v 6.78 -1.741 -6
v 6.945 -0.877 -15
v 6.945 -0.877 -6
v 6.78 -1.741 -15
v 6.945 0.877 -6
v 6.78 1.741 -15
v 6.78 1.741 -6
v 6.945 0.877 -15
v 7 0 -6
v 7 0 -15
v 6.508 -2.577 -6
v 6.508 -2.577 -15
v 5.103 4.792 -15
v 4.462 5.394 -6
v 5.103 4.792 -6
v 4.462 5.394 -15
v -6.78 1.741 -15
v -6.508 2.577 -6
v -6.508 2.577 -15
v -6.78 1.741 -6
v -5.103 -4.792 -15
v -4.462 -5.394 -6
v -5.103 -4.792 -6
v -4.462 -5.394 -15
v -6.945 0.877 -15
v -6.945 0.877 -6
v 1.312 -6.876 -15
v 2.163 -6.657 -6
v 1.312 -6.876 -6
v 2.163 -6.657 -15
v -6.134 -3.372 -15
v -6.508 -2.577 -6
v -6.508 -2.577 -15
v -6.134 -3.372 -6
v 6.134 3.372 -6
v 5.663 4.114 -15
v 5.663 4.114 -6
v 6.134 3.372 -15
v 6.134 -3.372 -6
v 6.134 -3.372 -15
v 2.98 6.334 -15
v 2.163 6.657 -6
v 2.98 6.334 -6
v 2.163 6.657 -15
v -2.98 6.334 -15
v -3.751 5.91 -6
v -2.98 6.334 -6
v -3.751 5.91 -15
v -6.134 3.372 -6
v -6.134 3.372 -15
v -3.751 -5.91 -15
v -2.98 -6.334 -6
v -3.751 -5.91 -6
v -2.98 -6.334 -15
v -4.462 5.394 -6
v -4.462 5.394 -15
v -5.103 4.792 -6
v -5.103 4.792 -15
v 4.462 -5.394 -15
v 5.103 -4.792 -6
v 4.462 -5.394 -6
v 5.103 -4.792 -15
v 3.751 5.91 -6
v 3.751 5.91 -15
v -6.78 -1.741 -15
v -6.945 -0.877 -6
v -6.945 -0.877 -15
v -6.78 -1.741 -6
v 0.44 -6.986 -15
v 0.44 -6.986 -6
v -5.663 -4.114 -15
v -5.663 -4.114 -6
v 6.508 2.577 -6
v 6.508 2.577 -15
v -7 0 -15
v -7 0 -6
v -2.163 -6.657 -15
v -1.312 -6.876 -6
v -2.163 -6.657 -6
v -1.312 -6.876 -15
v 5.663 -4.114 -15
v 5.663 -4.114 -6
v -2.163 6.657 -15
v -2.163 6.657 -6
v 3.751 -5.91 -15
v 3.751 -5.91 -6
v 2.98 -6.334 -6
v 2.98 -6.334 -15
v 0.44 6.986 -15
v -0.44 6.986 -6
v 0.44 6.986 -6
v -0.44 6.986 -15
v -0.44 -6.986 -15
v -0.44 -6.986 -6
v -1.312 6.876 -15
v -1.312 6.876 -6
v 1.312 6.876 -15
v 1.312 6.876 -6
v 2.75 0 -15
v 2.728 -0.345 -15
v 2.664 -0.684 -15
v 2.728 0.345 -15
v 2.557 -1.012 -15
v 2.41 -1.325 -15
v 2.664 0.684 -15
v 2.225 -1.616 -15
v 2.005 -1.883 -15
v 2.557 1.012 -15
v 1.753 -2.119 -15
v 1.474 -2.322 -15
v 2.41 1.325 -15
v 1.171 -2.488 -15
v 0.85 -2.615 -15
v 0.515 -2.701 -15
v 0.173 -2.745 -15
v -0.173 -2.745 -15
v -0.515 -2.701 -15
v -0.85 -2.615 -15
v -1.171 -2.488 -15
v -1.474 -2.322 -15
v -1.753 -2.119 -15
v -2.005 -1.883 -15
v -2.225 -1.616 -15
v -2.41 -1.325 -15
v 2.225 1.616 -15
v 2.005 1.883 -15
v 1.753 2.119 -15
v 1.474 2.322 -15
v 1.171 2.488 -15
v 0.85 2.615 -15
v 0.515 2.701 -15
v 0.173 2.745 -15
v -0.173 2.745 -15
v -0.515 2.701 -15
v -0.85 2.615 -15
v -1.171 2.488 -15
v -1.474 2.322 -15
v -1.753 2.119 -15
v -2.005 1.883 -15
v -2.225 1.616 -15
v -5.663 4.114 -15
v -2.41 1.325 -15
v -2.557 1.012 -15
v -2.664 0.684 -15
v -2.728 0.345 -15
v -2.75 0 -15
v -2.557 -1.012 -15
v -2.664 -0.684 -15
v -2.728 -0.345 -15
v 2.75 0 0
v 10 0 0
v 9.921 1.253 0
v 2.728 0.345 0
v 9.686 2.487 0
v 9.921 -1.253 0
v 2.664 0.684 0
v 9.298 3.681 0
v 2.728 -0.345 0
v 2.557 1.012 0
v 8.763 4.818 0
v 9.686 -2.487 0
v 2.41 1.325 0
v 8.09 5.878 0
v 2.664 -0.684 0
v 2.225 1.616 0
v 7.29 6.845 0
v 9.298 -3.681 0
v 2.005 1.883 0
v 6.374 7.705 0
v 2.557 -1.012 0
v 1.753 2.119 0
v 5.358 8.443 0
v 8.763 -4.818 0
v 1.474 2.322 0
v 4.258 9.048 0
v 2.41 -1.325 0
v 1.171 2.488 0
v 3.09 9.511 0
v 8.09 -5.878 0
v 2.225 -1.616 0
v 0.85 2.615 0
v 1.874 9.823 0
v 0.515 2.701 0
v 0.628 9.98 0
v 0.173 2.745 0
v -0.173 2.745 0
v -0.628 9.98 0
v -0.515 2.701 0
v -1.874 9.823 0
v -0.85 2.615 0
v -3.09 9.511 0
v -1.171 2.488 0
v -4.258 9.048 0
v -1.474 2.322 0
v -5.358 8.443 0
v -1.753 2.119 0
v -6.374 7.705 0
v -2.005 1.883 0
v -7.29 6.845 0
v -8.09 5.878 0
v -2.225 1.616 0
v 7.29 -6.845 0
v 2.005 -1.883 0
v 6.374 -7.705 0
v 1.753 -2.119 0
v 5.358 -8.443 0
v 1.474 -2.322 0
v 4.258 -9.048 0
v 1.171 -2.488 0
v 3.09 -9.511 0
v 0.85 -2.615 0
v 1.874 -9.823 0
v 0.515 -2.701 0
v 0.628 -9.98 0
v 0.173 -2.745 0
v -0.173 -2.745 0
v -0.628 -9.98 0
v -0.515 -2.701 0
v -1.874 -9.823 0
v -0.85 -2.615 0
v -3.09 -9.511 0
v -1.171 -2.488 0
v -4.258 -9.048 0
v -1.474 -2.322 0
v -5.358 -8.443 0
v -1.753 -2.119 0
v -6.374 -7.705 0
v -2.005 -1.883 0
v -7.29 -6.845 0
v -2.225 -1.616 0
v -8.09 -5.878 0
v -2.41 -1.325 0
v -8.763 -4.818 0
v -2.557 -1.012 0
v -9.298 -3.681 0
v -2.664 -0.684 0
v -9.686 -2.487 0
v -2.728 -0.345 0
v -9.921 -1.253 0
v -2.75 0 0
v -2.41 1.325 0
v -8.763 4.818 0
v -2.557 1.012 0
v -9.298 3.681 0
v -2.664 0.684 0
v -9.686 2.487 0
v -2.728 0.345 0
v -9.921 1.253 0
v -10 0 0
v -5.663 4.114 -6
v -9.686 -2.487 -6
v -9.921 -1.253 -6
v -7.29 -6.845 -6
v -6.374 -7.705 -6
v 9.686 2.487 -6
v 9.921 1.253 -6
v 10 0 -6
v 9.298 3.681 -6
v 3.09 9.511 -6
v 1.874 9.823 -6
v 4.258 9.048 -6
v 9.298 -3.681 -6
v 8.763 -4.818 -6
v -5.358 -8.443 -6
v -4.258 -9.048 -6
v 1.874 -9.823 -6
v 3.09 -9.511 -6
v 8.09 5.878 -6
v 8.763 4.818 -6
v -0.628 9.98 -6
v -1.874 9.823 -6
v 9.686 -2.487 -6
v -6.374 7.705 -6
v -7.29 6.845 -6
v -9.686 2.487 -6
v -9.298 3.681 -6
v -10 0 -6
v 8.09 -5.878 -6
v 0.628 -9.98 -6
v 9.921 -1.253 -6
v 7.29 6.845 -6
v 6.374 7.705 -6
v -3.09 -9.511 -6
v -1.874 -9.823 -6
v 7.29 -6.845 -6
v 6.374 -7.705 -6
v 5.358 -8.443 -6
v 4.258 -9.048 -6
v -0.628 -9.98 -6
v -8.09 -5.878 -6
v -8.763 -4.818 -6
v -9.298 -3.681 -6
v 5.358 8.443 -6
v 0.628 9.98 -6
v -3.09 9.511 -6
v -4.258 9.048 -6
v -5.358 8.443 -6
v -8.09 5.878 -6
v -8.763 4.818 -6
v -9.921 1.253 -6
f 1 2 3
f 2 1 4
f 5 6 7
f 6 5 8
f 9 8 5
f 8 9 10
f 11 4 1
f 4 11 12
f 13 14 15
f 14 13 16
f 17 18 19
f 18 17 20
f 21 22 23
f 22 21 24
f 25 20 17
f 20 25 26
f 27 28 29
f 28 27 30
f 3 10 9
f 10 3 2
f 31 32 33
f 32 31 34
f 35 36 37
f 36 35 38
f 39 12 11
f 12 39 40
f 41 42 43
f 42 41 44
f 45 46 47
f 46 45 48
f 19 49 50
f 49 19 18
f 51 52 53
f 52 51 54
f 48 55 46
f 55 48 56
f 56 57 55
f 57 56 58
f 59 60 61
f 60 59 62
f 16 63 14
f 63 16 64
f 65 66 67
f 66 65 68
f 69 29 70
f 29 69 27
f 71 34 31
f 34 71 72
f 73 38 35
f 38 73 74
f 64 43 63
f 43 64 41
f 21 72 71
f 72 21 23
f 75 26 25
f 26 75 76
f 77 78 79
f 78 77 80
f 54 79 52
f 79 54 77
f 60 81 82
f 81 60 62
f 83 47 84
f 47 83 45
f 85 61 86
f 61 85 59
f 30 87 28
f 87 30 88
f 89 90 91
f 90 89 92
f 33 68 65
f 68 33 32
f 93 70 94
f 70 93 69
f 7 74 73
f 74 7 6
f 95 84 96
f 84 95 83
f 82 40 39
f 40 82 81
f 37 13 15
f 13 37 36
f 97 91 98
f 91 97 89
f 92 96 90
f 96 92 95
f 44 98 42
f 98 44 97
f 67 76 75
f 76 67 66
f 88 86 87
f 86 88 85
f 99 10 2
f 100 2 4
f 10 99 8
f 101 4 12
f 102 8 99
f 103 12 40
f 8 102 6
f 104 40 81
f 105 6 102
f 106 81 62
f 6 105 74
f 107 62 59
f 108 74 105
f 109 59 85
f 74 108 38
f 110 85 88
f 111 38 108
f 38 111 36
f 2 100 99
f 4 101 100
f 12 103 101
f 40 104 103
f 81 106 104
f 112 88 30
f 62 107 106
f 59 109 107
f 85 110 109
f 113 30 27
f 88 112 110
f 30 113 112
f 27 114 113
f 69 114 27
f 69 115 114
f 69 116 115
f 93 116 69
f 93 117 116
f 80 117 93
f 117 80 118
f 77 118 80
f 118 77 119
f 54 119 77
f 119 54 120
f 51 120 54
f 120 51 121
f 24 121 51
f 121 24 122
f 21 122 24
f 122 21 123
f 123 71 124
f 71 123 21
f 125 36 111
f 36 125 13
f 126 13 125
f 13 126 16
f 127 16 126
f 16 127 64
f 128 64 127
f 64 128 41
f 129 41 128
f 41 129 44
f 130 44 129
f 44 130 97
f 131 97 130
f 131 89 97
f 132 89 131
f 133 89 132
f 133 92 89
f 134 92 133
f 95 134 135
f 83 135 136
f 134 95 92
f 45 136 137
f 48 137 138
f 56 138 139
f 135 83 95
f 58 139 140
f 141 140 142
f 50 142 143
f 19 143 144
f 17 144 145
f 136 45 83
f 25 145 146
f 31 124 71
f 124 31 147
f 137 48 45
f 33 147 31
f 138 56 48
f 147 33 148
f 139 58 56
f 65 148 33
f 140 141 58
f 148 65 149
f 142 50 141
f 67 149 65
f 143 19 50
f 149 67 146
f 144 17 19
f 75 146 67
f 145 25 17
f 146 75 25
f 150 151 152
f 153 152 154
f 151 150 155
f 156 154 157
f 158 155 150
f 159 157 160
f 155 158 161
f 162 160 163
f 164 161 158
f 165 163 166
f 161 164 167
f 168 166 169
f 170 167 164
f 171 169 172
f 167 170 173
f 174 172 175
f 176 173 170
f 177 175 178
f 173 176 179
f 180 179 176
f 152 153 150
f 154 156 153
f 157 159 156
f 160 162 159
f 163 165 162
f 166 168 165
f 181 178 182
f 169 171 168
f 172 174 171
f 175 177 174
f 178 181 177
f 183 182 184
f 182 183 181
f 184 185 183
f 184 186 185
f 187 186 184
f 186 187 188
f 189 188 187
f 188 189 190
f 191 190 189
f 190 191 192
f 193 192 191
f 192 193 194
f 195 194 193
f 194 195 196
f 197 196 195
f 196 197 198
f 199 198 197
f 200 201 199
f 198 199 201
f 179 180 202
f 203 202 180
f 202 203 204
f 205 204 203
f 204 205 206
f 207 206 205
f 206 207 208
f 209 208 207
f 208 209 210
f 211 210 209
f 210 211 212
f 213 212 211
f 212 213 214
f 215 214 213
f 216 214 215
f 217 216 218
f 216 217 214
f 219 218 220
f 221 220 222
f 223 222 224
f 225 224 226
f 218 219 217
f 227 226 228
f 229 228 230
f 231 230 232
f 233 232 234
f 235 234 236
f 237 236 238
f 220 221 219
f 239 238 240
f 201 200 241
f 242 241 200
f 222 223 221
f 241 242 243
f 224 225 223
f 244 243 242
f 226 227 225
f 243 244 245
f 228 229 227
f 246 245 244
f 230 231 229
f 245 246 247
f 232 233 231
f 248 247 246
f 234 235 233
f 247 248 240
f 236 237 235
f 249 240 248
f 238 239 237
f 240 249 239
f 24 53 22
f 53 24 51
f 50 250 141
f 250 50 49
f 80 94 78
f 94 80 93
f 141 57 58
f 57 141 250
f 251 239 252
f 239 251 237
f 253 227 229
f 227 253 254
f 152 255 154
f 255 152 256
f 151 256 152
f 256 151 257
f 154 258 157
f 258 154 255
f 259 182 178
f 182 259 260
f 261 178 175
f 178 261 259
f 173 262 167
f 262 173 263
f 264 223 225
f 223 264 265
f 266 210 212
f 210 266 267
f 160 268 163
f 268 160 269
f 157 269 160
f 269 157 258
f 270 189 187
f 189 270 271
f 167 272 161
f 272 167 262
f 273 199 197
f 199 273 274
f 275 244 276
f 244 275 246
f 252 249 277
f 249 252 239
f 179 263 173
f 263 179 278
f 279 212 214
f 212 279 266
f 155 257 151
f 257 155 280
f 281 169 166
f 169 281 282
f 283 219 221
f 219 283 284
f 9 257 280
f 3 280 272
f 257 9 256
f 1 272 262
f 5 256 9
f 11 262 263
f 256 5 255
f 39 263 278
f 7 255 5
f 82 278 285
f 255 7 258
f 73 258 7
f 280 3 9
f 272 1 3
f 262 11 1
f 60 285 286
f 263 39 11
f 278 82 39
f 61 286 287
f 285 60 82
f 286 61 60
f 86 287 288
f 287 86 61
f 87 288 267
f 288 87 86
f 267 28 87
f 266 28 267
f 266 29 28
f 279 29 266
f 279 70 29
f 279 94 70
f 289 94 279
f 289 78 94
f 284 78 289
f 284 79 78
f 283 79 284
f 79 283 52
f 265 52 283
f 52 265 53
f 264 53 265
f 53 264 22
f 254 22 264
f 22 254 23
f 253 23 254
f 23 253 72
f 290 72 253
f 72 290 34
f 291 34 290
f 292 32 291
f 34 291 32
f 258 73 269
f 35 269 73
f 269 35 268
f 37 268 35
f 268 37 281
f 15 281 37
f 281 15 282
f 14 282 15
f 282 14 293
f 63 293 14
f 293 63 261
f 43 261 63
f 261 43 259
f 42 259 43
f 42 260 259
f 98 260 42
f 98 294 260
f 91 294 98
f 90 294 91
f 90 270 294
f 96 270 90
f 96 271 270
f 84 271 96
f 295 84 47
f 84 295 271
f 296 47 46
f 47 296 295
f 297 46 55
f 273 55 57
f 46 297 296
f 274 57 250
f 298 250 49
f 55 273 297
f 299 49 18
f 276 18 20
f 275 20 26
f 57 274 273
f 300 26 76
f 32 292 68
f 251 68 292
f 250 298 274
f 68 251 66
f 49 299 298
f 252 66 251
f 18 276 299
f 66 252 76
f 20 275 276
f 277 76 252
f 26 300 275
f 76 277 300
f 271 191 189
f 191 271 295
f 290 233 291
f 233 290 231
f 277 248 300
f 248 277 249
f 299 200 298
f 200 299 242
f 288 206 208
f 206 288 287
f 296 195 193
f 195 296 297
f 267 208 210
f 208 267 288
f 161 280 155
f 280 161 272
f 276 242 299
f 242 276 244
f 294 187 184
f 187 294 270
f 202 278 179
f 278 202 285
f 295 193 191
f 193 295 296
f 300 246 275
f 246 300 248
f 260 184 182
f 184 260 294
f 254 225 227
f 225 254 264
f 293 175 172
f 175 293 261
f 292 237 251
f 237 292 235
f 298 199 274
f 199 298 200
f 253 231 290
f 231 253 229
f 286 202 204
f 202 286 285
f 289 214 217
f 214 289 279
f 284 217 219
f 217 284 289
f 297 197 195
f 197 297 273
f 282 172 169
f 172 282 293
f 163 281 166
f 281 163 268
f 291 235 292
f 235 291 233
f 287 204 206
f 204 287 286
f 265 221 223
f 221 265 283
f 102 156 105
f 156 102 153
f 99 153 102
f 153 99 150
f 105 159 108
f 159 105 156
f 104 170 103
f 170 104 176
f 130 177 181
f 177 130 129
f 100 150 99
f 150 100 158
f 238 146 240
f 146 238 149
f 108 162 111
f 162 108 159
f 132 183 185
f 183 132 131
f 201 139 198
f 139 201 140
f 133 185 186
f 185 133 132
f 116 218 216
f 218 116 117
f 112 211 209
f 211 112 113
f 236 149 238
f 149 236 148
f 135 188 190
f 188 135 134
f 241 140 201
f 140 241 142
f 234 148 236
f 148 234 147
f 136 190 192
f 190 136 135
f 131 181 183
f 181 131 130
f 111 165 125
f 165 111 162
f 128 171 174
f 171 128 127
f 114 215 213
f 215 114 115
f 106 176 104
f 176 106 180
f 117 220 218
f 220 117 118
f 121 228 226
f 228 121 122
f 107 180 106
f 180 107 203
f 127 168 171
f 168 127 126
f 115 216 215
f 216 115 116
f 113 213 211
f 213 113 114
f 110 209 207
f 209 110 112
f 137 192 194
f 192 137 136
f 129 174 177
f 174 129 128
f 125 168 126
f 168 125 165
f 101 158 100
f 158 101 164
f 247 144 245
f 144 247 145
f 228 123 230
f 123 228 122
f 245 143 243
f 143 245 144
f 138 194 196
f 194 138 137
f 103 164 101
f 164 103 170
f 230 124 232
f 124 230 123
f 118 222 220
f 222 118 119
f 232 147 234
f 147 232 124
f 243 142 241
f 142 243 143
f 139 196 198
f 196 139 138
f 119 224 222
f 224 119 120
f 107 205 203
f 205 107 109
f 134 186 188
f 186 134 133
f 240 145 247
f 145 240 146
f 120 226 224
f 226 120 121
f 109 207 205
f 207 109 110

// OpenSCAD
$fn = 50;


difference() {
	union() {
		translate(v = [0, 0, -15.0000000000]) {
			cylinder(h = 15, r = 7.0000000000);
		}
		translate(v = [0, 0, -6.0000000000]) {
			cylinder(h = 6, r = 10.0000000000);
		}
	}
	union() {
		#translate(v = [0, 0, -15]) {
			cylinder(h = 15, r = 2.7500000000);
		}
	}
}
